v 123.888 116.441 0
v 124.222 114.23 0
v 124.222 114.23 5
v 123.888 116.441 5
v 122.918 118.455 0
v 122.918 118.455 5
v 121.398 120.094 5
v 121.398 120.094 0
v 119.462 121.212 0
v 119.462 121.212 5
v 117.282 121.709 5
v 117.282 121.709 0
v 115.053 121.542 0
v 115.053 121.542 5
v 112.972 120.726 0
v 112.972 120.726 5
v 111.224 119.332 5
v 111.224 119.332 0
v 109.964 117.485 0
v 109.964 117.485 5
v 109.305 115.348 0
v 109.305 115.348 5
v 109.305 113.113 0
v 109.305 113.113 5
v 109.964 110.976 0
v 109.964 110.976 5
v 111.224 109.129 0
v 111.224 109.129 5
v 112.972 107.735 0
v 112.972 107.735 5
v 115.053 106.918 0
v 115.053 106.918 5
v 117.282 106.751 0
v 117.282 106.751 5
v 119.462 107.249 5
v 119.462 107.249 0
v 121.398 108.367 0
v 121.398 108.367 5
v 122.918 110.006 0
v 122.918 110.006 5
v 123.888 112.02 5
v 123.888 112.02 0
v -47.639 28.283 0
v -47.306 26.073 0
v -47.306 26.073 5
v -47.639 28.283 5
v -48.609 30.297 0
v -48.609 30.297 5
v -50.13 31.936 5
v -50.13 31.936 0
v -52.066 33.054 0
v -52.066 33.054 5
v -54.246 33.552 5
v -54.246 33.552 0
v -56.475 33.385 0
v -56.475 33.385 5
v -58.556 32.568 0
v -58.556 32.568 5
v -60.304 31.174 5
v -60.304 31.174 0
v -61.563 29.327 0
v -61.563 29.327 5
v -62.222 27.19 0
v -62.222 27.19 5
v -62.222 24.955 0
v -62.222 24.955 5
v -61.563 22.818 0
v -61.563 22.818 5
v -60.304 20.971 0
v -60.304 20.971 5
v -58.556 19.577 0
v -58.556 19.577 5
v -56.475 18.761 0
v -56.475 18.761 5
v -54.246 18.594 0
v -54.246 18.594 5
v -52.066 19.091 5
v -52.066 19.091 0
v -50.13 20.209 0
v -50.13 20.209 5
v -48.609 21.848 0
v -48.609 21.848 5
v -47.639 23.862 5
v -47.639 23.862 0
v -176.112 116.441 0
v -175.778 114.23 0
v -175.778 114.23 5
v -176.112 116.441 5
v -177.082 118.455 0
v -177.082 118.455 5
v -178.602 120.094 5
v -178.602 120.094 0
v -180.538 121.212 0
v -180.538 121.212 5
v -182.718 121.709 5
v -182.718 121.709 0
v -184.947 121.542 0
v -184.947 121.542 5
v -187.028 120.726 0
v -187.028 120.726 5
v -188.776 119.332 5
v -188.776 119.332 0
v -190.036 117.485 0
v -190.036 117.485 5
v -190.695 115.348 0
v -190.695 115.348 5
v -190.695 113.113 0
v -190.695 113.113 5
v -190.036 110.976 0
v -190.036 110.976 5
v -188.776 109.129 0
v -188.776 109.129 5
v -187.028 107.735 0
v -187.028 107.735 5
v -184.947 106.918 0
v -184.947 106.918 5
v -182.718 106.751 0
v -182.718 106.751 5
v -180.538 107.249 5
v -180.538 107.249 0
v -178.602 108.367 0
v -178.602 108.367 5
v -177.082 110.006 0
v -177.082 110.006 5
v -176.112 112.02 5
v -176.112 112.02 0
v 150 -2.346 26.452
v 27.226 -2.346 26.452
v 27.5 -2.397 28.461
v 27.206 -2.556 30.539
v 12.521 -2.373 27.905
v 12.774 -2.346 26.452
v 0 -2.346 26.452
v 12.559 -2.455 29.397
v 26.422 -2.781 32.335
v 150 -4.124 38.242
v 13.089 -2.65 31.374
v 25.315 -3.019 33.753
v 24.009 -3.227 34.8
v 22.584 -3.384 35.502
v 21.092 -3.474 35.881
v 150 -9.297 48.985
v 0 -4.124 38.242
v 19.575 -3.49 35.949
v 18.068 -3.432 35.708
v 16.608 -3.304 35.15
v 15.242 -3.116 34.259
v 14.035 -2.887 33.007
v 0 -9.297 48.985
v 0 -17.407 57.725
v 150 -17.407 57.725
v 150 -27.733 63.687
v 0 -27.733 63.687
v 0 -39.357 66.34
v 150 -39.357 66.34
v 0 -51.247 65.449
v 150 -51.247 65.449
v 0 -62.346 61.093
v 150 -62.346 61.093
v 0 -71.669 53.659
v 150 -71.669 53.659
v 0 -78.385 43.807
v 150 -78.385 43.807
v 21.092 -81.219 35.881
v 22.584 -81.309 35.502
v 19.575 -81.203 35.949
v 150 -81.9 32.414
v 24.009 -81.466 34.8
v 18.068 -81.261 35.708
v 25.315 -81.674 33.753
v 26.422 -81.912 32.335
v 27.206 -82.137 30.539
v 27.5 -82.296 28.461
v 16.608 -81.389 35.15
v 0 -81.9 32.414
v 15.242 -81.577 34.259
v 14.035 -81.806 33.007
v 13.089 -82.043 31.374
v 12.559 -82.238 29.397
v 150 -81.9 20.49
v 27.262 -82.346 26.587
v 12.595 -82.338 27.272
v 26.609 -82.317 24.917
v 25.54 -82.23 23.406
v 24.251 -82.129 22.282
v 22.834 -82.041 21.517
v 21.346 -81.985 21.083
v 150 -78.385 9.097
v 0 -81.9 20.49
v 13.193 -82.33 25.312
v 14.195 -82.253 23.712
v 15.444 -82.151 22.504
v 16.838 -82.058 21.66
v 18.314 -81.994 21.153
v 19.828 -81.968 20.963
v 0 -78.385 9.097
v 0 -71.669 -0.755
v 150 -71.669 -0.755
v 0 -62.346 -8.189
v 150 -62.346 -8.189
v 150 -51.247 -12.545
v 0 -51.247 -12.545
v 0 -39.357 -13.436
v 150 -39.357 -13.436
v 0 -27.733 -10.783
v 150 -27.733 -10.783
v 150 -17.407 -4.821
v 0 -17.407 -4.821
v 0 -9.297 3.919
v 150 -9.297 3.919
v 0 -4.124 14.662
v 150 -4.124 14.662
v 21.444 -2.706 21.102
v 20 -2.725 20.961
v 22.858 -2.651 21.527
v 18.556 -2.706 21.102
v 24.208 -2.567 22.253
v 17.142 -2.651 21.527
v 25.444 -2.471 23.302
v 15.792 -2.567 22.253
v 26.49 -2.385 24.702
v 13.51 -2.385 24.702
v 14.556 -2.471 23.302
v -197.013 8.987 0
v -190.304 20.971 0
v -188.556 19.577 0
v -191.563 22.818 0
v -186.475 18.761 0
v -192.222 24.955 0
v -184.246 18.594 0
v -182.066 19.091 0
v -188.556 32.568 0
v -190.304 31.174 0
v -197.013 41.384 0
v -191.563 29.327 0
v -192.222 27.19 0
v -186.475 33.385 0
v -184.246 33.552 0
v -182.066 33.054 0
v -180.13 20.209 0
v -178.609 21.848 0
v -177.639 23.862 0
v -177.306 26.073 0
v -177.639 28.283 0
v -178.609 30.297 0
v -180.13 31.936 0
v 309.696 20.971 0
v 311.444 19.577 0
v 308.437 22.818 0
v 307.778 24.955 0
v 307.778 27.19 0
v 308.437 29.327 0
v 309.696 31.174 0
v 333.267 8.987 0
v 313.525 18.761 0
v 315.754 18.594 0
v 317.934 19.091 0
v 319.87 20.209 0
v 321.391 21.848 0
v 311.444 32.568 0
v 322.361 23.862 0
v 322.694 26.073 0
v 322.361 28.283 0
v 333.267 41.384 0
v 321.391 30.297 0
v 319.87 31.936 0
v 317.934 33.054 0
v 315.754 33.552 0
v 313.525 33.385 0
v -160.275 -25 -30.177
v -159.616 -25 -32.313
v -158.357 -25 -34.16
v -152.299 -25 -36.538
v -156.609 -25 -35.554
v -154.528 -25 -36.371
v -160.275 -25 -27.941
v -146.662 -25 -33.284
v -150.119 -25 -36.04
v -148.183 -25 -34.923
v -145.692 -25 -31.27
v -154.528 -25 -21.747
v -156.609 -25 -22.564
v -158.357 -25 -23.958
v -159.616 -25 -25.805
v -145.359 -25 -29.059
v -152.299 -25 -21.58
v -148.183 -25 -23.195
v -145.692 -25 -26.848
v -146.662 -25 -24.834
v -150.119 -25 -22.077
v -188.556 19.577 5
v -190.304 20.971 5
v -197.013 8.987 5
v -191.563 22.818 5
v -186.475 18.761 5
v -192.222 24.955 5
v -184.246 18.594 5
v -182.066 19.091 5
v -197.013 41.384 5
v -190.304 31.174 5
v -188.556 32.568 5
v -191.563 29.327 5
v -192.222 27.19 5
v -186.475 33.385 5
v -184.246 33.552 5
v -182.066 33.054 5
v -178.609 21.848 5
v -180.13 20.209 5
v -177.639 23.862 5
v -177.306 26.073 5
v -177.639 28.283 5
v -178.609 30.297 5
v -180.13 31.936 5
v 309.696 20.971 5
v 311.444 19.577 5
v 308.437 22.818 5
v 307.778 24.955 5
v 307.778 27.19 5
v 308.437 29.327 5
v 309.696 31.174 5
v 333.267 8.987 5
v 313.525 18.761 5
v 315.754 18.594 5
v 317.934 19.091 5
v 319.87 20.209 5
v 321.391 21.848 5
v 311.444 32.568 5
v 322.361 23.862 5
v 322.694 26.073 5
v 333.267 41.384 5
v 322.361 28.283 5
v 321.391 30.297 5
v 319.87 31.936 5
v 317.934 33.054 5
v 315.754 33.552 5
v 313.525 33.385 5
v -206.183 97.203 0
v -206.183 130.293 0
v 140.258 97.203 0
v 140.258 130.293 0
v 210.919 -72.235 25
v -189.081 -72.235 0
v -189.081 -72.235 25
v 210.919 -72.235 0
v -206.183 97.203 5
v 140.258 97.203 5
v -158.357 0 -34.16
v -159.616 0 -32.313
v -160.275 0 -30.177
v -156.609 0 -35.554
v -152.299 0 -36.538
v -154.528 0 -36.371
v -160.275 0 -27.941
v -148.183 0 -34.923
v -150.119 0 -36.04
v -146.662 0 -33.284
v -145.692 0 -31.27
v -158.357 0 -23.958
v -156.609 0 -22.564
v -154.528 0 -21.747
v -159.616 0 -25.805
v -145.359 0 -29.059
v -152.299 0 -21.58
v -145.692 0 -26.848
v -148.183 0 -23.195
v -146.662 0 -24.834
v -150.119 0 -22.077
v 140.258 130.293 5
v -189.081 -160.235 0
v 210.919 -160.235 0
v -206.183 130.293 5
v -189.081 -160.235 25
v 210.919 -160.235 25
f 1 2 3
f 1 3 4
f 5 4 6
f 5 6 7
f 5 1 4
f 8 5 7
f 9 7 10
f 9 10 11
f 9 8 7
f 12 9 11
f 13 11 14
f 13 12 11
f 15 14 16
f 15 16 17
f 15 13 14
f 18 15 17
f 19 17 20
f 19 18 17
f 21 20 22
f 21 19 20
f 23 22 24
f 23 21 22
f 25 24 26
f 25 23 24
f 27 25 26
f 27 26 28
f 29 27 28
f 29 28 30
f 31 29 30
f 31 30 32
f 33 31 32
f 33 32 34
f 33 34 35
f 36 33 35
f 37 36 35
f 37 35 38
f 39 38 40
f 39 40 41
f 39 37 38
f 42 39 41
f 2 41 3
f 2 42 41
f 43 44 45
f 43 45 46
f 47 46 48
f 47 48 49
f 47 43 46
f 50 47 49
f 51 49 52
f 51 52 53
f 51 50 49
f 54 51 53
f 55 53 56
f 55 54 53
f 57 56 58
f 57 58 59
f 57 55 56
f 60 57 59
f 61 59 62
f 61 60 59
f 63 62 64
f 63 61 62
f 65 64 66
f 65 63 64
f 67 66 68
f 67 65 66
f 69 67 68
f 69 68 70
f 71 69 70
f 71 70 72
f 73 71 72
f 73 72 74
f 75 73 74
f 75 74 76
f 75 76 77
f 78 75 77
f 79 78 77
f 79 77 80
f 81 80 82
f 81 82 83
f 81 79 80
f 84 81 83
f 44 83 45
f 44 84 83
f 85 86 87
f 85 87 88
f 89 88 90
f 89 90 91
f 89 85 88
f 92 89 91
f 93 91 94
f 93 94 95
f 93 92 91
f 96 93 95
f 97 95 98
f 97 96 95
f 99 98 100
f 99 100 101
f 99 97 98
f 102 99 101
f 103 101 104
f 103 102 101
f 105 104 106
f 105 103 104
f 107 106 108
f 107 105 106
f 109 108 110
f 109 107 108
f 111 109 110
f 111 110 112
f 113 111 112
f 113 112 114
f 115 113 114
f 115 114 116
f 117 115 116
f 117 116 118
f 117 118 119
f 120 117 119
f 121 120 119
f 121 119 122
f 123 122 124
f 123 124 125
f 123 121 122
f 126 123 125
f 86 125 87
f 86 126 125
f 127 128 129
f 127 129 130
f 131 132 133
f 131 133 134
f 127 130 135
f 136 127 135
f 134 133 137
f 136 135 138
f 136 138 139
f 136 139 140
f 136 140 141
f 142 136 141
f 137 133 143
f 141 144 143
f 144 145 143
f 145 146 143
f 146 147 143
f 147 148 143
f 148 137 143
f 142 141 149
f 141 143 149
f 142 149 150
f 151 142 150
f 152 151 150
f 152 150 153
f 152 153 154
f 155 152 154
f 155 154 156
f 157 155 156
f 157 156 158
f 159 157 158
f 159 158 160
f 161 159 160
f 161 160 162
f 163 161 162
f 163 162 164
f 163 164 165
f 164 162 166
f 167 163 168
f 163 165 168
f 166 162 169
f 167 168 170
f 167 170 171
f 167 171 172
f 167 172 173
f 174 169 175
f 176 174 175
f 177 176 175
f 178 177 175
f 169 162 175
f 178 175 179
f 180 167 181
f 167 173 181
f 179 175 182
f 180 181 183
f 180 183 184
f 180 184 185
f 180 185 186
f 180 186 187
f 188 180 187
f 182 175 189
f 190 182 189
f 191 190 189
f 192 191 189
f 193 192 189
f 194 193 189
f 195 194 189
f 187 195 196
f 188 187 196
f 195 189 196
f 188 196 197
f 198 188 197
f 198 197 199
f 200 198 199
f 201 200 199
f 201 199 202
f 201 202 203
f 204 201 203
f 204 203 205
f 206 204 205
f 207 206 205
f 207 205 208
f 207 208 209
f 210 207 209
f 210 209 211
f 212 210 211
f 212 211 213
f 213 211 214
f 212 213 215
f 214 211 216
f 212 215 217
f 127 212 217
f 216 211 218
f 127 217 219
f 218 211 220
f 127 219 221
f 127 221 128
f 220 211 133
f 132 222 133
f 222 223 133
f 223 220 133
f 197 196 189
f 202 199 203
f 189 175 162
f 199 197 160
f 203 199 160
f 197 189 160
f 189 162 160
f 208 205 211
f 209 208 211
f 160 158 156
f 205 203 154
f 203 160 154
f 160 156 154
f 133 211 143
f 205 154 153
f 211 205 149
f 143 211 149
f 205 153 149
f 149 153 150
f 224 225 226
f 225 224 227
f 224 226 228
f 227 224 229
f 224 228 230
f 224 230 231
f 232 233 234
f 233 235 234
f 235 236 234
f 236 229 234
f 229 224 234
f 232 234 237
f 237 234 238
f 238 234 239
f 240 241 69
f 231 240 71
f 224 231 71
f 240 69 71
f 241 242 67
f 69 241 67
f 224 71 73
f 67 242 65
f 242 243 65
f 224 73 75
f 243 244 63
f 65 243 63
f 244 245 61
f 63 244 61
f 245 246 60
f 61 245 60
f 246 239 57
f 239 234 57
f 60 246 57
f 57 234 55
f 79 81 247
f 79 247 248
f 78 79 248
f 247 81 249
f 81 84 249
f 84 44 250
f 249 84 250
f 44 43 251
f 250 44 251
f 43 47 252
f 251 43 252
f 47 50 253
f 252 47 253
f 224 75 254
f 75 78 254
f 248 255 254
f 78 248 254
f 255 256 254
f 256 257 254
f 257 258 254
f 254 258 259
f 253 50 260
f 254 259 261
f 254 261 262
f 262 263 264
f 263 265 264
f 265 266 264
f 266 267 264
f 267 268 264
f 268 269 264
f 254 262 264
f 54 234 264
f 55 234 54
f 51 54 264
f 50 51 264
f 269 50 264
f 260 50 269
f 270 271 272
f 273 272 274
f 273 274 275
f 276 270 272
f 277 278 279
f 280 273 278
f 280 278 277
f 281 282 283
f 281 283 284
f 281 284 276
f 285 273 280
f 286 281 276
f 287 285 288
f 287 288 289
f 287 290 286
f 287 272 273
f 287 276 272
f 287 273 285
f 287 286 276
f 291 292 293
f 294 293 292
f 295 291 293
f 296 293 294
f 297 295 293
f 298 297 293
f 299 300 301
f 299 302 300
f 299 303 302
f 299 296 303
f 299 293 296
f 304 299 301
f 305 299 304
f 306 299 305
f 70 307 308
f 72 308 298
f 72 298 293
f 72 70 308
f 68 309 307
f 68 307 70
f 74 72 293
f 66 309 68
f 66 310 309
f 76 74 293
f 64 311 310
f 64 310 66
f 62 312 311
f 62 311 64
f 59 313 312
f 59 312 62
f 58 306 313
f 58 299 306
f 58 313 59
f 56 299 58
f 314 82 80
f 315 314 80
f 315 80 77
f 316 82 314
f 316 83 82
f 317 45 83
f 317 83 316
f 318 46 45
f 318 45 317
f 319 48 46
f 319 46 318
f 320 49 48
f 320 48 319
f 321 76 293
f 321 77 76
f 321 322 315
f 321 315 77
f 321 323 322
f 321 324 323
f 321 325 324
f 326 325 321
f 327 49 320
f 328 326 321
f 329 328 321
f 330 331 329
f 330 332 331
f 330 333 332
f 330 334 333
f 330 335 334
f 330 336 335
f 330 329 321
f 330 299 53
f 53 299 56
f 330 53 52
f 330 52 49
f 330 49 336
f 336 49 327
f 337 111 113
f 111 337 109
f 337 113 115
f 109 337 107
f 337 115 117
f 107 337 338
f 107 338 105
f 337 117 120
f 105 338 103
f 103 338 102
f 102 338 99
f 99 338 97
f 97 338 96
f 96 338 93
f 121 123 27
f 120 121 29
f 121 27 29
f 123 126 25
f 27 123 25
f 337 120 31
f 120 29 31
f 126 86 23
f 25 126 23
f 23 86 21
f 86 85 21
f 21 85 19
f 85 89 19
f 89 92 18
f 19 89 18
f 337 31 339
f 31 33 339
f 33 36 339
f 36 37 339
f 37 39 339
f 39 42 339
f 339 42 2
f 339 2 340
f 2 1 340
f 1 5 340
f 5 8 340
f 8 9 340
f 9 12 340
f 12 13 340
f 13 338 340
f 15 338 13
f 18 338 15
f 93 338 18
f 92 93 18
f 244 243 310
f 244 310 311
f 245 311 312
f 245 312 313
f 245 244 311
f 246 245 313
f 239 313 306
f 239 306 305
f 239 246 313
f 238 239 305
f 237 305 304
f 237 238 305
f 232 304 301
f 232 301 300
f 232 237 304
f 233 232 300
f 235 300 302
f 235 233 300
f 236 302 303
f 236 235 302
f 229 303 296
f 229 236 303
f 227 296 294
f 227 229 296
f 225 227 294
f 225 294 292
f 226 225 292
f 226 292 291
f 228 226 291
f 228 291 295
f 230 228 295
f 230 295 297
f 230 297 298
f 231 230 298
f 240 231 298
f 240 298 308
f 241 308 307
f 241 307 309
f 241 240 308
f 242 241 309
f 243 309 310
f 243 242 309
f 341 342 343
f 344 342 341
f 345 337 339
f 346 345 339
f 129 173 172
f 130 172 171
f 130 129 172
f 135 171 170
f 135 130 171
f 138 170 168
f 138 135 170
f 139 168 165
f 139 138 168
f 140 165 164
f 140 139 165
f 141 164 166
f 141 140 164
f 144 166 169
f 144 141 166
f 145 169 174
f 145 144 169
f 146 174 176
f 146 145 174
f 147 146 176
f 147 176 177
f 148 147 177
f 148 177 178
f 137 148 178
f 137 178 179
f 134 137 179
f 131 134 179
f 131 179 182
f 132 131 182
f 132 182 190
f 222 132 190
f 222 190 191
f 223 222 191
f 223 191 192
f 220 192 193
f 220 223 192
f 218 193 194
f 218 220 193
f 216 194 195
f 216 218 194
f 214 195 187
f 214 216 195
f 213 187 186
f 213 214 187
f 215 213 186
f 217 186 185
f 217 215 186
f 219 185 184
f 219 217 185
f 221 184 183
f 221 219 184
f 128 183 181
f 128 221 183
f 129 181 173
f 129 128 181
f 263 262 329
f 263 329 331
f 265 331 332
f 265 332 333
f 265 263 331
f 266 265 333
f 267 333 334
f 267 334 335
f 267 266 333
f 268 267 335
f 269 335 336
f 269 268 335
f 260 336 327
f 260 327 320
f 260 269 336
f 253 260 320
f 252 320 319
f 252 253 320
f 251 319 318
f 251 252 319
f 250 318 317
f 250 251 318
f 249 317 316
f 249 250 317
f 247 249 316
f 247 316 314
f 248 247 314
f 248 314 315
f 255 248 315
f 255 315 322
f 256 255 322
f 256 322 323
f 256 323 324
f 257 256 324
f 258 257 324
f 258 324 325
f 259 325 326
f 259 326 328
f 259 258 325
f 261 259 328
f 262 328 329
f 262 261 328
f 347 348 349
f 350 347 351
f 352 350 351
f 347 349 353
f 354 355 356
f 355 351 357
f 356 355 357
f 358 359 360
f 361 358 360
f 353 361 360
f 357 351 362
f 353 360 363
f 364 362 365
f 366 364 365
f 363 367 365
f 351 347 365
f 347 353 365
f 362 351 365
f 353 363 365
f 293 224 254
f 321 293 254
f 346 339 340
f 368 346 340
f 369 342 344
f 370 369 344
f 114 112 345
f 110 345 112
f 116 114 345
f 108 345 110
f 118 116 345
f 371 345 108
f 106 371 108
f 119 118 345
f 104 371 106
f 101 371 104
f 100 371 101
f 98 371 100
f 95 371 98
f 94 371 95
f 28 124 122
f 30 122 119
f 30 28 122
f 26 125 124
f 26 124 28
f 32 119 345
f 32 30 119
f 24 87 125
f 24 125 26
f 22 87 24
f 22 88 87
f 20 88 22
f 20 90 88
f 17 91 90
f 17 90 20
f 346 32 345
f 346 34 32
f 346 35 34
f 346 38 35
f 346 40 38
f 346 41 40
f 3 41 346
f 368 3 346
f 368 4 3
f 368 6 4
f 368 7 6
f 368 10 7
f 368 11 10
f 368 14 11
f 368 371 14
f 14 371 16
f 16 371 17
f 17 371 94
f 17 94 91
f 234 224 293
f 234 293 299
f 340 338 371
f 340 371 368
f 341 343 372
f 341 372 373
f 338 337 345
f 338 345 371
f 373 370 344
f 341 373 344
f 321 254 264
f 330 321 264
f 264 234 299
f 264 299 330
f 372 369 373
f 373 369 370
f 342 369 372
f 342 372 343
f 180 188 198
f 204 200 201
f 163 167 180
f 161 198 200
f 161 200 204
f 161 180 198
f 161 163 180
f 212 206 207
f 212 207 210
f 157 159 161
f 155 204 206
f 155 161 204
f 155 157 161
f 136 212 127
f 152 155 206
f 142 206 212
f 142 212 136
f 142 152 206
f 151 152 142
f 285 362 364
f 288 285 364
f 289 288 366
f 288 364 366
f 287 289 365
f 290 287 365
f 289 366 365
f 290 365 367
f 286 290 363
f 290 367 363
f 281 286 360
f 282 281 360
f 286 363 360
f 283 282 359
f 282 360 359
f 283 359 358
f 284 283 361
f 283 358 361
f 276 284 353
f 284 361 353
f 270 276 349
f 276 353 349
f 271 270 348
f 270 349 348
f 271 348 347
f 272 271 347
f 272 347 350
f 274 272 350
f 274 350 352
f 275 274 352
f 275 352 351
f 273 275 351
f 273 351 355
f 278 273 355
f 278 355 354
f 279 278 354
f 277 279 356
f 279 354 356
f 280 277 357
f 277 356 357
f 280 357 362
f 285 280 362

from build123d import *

# Parameters (mm, degrees)
F0_R      = 40
F1_DEPTH  = 150
F2_R      = 7.5
F3_DEPTH  = 82.347489
F4_W      = 530.280009
F4_H      = 32.396527
F4_R      = 7.5
F5_DEPTH  = 5
F6_R      = 7.5
F7_DEPTH  = 25
F8_W      = 400
F8_H      = 88
F9_DEPTH  = 25
F10_W     = 346.440271
F10_H     = 33.090777
F10_R     = 7.5
F11_DEPTH = 5


with BuildPart() as f1:
    # F0 (on Right) → F1 (new body)
    with BuildSketch(Plane.YZ):
        with Locations((-42.346489, 26.451953)):
            Circle(F0_R)
    extrude(amount=F1_DEPTH)

    # F2 (on Front) → F3 (cut, through all)
    with BuildSketch(Plane.XZ):
        with Locations((20, 28.46138)):
            Circle(F2_R)
    extrude(amount=F3_DEPTH, mode=Mode.SUBTRACT)


with BuildPart() as f5:
    # F4 (on Top) → F5 (new body)
    with BuildSketch(Plane.XY):
        with Locations((68.127088, 25.185617)):
            Rectangle(F4_W, F4_H)
        with Locations((-184.806153, 26.072554)):
            Circle(F4_R, mode=Mode.SUBTRACT)
        with Locations((-54.806153, 26.072554)):
            Circle(F4_R, mode=Mode.SUBTRACT)
        with Locations((315.193847, 26.072554)):
            Circle(F4_R, mode=Mode.SUBTRACT)
    extrude(amount=F5_DEPTH)


with BuildPart() as f7:
    # F6 (on Front) → F7 (new body)
    with BuildSketch(Plane.XZ):
        with Locations((-152.859062, -29.058892)):
            Circle(F6_R)
    extrude(amount=F7_DEPTH)


with BuildPart() as f9:
    # F8 (on Top) → F9 (new body)
    with BuildSketch(Plane.XY):
        with Locations((10.918853, -116.234779)):
            Rectangle(F8_W, F8_H)
    extrude(amount=F9_DEPTH)


with BuildPart() as f11:
    # F10 (on Top) → F11 (new body)
    with BuildSketch(Plane.XY):
        with Locations((-32.96239, 113.747965)):
            Rectangle(F10_W, F10_H)
        with Locations((-183.278471, 114.230417)):
            Circle(F10_R, mode=Mode.SUBTRACT)
        with Locations((116.721529, 114.230417)):
            Circle(F10_R, mode=Mode.SUBTRACT)
    extrude(amount=F11_DEPTH)


solid = Compound([f1.part, f5.part, f7.part, f9.part, f11.part])
